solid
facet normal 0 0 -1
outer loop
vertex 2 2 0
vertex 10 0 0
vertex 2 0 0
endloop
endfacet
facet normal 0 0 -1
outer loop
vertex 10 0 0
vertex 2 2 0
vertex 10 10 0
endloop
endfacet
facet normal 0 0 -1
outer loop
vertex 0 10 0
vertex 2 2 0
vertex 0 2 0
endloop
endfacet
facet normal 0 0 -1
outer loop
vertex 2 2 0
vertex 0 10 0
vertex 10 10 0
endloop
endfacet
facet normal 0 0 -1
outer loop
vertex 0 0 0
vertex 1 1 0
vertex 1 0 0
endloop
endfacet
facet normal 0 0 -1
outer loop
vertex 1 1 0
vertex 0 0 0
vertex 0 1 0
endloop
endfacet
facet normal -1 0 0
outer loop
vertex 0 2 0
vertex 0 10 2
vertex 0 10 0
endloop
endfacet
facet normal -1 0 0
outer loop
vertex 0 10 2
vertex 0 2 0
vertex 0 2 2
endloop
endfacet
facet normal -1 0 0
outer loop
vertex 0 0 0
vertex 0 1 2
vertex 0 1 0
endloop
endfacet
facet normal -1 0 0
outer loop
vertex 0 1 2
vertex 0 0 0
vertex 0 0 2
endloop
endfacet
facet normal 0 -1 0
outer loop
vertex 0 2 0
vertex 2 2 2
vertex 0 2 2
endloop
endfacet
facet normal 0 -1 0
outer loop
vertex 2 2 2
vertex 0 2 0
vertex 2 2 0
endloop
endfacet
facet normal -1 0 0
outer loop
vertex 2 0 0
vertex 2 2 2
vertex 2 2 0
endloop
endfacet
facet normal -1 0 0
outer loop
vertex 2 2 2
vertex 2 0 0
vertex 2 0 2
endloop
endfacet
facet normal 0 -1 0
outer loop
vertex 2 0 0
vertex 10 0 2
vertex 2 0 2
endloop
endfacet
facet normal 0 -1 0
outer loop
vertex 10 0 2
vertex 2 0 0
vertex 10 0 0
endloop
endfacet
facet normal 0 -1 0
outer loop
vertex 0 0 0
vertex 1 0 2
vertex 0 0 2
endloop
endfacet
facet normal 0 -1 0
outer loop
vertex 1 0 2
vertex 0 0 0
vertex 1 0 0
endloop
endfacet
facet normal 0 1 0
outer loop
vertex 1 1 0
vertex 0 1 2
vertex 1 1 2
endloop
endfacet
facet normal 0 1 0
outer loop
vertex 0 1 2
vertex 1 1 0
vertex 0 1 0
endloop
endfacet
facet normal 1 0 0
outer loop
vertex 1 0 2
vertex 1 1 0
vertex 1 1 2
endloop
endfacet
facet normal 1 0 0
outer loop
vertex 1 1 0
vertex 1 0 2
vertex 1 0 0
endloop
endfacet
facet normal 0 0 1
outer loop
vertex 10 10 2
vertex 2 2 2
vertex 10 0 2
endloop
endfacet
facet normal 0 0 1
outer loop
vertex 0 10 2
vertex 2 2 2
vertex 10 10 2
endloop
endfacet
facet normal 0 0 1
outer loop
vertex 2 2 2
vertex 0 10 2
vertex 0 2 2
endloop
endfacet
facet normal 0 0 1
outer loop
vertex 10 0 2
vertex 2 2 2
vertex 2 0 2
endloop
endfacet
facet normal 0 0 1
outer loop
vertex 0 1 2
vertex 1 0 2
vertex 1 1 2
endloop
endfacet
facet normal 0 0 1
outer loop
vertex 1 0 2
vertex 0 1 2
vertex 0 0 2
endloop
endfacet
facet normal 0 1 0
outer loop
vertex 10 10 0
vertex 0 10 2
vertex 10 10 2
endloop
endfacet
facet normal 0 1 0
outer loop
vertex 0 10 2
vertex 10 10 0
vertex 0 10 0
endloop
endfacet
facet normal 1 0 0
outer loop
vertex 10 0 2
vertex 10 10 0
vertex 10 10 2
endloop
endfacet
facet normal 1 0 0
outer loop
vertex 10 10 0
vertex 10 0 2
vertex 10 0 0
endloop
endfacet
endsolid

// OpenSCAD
difference() {
    linear_extrude(2) square(10);
    difference() {
        linear_extrude(3) square(2);
        linear_extrude(3) square(1);
    }
}
